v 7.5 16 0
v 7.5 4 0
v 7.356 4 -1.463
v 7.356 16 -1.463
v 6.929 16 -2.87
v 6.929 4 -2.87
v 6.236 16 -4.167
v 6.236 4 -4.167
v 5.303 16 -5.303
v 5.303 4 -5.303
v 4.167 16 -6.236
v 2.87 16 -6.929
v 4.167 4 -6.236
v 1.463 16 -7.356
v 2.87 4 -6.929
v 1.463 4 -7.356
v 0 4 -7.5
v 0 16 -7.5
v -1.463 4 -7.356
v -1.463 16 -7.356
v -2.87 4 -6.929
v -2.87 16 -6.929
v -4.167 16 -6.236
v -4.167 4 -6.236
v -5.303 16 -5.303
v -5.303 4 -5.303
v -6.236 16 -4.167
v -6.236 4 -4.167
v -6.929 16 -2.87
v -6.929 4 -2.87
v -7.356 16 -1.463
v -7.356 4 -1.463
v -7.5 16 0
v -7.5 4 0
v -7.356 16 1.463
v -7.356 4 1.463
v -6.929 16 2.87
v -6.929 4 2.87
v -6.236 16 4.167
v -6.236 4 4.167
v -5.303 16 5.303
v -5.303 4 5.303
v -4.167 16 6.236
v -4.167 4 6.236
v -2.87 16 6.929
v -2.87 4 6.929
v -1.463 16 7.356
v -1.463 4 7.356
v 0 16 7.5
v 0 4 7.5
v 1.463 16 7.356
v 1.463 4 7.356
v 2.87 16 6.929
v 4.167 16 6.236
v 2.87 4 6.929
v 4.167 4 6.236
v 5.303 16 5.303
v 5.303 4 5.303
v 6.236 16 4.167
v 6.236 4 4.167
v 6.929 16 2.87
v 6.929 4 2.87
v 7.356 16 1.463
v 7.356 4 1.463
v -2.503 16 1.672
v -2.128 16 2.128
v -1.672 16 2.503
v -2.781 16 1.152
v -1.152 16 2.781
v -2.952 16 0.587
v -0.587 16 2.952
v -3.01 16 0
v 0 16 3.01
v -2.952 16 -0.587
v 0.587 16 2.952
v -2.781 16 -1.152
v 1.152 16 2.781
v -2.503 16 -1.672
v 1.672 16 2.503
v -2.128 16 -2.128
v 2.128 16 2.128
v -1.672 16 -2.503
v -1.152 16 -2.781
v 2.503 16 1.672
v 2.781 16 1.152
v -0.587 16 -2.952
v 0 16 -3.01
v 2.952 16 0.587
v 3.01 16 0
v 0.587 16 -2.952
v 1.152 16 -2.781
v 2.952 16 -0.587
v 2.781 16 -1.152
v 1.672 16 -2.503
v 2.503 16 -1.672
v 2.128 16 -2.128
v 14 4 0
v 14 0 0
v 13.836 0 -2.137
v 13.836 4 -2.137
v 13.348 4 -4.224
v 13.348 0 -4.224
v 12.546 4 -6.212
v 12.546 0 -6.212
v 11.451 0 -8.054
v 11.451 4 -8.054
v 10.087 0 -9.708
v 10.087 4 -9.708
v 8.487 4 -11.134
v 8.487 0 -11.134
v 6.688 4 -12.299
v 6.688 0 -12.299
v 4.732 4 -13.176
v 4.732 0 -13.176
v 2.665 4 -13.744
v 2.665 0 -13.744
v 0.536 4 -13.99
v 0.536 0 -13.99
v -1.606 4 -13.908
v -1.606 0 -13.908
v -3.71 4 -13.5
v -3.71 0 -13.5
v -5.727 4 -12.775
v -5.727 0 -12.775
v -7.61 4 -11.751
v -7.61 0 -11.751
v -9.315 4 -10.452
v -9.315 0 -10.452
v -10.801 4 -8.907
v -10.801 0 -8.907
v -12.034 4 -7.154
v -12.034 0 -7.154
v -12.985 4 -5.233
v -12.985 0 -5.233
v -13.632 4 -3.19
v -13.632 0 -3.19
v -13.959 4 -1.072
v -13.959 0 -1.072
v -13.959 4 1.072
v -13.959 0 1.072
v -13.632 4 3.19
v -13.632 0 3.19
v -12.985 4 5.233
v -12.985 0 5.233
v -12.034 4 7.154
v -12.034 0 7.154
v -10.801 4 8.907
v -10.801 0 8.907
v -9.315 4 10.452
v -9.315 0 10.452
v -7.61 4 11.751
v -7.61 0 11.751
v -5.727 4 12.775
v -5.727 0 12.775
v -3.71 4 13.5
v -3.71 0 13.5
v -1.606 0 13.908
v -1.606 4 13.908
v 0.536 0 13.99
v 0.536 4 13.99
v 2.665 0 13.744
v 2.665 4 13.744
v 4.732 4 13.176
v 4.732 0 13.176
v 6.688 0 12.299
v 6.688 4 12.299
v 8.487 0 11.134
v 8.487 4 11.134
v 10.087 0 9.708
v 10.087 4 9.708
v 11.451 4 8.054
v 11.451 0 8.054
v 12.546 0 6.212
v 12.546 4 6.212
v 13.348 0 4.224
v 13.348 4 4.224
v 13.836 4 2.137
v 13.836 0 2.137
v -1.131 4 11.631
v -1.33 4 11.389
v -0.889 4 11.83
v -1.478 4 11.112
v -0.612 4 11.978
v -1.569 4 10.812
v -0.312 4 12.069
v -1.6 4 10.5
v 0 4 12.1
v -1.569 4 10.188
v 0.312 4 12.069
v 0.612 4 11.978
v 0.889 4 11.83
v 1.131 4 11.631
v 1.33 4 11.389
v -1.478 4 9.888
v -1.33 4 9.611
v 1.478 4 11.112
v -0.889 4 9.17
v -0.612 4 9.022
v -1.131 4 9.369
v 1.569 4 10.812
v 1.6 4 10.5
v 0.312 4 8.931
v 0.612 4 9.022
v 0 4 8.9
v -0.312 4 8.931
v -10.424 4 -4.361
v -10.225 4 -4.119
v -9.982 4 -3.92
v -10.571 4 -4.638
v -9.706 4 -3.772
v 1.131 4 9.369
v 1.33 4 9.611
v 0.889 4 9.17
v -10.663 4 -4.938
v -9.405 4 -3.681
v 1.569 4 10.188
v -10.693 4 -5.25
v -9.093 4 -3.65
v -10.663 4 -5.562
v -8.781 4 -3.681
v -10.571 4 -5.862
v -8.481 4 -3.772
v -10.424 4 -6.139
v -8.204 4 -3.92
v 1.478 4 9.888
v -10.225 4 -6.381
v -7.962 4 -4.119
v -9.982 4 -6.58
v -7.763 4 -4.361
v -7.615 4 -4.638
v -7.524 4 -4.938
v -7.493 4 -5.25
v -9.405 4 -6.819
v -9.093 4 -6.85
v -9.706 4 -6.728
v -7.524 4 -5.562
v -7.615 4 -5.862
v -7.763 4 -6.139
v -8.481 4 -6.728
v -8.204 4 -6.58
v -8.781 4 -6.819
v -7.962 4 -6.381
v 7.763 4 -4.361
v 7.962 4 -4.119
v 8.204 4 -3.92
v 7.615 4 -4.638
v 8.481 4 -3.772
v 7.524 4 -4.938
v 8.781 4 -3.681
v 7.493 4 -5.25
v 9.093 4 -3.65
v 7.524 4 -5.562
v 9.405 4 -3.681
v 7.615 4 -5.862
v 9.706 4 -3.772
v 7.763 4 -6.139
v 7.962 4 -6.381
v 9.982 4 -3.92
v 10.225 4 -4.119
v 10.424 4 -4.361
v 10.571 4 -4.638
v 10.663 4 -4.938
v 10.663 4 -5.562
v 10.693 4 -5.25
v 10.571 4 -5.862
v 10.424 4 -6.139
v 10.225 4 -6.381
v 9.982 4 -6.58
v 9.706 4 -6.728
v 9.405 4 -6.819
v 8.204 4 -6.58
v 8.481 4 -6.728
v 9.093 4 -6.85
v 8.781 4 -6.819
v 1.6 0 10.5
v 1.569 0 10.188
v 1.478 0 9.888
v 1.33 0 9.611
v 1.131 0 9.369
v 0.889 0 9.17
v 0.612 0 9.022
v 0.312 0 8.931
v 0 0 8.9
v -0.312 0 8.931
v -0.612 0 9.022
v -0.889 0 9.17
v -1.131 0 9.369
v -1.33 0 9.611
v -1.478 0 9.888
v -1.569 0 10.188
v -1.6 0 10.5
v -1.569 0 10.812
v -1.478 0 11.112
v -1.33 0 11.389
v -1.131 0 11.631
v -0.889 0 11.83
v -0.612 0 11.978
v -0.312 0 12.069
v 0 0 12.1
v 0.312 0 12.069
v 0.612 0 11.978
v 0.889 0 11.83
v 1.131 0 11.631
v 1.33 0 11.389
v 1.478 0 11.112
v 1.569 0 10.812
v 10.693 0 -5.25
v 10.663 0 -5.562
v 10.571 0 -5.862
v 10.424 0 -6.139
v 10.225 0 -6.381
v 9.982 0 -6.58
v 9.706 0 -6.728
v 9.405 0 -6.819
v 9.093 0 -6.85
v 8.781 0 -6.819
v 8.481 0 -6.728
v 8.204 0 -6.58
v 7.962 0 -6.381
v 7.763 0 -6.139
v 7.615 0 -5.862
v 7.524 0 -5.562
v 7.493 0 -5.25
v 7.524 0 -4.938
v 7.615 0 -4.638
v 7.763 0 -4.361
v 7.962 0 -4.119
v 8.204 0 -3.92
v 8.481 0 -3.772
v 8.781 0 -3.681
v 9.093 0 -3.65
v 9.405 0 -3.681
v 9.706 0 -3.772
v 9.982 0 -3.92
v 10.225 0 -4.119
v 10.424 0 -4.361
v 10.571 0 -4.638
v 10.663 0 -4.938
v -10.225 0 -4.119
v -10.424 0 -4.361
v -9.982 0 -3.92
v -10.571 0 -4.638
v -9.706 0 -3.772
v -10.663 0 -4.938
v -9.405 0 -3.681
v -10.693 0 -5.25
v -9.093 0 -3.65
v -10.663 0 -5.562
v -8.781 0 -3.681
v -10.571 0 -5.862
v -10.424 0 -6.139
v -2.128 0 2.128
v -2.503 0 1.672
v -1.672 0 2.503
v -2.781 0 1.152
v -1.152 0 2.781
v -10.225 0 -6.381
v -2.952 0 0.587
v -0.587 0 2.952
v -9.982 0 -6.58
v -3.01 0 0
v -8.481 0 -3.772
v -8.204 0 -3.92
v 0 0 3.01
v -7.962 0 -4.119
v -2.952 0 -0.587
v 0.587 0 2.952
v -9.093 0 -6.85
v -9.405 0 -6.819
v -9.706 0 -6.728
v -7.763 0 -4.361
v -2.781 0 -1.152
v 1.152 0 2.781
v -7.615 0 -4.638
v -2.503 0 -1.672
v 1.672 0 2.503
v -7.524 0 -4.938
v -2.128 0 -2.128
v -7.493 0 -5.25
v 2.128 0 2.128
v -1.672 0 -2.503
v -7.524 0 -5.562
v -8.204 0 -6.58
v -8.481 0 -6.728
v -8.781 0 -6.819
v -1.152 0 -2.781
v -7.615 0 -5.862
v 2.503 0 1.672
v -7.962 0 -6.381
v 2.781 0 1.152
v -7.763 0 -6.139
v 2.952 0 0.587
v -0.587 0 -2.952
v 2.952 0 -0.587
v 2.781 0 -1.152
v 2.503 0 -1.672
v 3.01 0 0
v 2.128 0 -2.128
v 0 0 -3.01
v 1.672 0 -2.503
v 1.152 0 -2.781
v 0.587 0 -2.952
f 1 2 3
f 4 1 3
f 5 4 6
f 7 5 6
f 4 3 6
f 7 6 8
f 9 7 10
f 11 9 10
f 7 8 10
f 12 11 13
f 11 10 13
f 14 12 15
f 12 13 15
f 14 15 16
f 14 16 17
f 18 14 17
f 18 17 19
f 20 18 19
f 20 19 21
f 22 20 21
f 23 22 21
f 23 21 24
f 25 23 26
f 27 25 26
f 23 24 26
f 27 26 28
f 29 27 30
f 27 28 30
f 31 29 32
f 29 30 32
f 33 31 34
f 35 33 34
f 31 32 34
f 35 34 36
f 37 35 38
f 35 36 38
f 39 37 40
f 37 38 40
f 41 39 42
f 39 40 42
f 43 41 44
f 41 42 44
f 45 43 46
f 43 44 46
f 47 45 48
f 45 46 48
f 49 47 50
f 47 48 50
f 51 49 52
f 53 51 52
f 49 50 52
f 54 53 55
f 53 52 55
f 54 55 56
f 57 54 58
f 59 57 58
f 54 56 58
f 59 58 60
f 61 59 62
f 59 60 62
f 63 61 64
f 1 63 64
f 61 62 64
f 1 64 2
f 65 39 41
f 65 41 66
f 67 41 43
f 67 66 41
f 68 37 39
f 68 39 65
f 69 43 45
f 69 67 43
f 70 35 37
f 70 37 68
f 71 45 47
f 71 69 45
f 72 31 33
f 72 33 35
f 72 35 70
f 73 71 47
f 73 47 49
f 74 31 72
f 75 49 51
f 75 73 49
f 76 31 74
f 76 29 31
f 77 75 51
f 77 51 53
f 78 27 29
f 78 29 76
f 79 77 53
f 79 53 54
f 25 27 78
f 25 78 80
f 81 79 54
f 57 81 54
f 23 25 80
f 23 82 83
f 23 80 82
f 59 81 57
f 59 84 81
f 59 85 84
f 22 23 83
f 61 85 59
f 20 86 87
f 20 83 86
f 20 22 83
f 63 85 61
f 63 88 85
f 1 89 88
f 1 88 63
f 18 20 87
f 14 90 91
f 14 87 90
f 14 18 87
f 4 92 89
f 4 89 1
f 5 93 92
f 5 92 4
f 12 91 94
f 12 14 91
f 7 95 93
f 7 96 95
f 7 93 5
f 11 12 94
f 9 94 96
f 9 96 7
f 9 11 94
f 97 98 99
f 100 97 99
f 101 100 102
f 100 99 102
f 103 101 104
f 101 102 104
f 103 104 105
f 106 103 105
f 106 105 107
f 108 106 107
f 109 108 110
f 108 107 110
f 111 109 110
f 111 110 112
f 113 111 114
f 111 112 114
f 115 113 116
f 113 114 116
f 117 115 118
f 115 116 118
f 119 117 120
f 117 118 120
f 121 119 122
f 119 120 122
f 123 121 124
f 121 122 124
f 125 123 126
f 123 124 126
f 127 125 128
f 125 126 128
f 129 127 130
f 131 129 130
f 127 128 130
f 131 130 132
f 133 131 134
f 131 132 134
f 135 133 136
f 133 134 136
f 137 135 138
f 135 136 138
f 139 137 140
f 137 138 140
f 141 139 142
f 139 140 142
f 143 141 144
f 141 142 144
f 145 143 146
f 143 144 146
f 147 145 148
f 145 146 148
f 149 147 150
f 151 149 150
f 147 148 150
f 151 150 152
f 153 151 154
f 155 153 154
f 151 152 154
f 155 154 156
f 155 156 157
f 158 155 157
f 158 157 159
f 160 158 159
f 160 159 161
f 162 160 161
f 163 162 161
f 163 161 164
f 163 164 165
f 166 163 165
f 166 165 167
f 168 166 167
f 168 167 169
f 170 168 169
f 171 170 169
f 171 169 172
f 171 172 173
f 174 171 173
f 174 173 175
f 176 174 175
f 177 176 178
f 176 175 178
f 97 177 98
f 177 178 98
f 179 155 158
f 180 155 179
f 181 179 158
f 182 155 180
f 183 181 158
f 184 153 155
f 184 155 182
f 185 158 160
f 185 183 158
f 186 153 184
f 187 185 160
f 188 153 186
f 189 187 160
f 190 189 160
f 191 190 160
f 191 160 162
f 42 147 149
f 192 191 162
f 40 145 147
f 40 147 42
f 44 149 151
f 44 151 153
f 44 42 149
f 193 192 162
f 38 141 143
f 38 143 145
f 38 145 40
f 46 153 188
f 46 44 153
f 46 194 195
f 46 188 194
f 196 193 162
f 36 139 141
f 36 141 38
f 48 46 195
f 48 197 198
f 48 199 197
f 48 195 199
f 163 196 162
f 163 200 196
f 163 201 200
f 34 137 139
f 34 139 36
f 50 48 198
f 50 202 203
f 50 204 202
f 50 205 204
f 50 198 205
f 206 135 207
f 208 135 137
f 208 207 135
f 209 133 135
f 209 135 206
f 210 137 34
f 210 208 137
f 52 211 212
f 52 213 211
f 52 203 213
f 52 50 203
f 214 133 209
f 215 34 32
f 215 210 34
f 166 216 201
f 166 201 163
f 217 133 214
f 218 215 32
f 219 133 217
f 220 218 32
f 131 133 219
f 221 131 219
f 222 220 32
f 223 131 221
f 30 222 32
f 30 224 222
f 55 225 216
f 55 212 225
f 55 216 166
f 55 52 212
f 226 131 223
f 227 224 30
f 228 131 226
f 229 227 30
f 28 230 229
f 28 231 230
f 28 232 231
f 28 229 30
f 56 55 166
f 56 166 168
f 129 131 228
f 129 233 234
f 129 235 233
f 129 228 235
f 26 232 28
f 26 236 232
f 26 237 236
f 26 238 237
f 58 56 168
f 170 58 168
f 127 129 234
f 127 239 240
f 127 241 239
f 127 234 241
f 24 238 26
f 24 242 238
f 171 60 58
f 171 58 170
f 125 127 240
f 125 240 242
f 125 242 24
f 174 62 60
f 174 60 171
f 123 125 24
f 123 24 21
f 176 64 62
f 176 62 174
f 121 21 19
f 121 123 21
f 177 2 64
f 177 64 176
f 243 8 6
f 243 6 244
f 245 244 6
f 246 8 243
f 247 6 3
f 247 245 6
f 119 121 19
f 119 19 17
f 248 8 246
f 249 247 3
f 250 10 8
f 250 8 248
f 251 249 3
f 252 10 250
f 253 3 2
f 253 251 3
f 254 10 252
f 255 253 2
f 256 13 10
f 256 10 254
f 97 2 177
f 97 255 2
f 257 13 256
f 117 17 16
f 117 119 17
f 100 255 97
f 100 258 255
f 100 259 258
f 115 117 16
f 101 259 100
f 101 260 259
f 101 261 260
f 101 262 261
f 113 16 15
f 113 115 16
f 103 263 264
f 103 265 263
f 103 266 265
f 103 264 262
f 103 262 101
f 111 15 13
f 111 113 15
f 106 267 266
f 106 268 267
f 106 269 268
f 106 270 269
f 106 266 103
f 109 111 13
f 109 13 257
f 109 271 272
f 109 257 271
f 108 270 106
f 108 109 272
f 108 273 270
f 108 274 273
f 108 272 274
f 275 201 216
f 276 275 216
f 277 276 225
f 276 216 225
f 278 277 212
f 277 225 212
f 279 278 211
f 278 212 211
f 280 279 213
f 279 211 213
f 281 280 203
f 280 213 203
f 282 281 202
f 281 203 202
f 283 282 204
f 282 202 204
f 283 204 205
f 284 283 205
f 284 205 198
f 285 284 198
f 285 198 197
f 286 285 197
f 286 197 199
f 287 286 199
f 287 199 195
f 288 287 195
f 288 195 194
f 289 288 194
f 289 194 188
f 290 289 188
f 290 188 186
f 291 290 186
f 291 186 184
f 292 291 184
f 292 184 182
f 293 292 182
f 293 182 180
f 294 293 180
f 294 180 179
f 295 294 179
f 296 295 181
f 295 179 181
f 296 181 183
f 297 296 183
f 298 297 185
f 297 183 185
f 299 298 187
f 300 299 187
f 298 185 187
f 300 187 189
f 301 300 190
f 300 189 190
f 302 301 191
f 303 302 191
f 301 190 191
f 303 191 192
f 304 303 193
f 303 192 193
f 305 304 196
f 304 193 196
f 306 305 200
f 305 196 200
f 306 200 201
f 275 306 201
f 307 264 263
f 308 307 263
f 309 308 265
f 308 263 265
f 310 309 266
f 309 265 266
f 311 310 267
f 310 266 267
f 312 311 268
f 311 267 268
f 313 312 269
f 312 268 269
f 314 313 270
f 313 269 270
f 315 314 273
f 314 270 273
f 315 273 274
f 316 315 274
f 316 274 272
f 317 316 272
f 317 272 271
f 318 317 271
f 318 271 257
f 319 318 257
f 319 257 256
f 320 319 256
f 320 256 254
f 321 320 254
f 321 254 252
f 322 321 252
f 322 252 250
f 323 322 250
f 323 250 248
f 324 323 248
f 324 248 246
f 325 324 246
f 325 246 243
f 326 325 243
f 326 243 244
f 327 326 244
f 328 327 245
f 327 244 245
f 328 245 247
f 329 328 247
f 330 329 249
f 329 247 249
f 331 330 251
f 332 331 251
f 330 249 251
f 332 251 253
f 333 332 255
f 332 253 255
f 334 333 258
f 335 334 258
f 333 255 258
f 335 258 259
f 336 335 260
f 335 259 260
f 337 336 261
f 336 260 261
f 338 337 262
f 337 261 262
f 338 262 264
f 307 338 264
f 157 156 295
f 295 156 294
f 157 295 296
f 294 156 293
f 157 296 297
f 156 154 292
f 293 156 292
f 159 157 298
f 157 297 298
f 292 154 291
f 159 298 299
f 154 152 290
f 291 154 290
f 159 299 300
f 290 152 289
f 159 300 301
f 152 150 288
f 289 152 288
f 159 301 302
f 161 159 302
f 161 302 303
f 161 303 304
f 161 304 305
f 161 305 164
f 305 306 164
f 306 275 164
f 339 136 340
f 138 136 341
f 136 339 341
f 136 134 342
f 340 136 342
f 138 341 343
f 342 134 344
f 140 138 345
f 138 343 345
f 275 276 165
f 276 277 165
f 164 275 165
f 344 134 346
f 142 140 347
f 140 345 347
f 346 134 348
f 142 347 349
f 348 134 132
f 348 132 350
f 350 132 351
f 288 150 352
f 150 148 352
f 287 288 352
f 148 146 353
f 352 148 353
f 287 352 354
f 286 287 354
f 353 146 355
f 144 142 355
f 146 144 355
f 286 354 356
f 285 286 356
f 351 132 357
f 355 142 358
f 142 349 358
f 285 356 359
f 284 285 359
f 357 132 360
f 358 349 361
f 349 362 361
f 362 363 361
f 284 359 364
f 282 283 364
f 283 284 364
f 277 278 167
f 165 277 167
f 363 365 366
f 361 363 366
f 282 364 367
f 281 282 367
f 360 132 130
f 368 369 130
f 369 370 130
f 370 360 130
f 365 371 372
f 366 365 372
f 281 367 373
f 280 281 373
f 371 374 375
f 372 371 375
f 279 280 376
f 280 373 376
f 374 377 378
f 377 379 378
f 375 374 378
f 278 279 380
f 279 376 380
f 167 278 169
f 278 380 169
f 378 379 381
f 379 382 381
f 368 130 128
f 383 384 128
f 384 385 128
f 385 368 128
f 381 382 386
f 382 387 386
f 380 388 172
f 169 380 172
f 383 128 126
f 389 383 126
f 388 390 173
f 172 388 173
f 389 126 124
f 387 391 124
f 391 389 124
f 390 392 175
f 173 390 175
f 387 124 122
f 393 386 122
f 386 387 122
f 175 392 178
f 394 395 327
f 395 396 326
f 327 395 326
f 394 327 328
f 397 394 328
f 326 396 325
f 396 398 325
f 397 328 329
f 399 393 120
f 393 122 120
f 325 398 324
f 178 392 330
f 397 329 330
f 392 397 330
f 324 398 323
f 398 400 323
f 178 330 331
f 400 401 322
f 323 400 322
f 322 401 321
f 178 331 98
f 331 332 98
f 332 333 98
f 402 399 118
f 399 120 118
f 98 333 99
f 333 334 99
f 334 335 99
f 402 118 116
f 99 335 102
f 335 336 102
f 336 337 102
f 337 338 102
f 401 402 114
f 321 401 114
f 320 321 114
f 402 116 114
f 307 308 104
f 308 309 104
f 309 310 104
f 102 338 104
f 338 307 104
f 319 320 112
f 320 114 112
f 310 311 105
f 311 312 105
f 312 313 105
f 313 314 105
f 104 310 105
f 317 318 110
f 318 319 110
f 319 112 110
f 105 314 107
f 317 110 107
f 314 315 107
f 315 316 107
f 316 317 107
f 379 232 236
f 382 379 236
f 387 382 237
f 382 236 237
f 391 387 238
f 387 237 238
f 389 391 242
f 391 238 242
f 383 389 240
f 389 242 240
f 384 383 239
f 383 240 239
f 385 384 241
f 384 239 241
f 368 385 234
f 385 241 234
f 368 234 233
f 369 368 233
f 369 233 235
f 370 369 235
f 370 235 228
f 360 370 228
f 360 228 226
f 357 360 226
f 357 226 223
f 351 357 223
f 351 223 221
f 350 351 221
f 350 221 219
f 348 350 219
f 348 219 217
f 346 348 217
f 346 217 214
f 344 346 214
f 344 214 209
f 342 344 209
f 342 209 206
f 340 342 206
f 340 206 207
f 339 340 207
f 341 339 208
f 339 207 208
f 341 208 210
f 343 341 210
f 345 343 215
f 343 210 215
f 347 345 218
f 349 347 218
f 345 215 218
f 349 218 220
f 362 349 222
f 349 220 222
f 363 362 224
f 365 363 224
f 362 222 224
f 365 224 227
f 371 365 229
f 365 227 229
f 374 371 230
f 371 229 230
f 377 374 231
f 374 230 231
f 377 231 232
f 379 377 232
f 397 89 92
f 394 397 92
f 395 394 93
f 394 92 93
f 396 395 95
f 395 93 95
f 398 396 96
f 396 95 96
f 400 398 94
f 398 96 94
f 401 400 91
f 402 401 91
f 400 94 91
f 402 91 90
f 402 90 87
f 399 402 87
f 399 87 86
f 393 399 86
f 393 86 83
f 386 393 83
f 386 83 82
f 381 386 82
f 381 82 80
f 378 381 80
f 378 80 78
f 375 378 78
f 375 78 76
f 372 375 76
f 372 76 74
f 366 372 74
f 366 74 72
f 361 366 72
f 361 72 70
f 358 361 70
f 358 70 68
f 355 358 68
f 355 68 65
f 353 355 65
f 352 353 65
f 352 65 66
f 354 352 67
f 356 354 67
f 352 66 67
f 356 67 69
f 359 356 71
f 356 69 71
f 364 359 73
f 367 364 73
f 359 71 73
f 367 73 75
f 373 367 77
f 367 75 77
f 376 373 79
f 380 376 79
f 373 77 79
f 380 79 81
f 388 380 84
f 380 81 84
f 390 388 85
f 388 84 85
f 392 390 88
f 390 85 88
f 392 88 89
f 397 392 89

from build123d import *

# Parameters (mm, degrees)
SKETCH2_R           = 14
BOSS_EXTRUDE1_DEPTH = 4
SKETCH3_R           = 7.5
BOSS_EXTRUDE2_DEPTH = 12
SKETCH4_R           = 3.01
CUT_EXTRUDE1_DEPTH  = 17
SKETCH5_R           = 1.6
CUT_EXTRUDE2_DEPTH  = 12


with BuildPart() as part:
    # Sketch2 → Boss-Extrude1 (new body)
    with BuildSketch(Plane(origin=(0, 0, 0), x_dir=(1, 0, 0), z_dir=(0, 1, 0))):
        Circle(SKETCH2_R)
    extrude(amount=BOSS_EXTRUDE1_DEPTH)

    # Sketch3 → Boss-Extrude2 (add)
    with BuildSketch(Plane(origin=(0, 4, 0), x_dir=(1, 0, 0), z_dir=(0, 1, 0))):
        Circle(SKETCH3_R)
    extrude(amount=BOSS_EXTRUDE2_DEPTH)

    # Sketch4 → Cut-Extrude1 (cut, through all)
    with BuildSketch(Plane(origin=(0, 16, 0), x_dir=(1, 0, 0), z_dir=(0, 1, 0))):
        Circle(SKETCH4_R)
    extrude(amount=-CUT_EXTRUDE1_DEPTH, mode=Mode.SUBTRACT)

    # Sketch5 → Cut-Extrude2 (cut)
    with BuildSketch(Plane(origin=(0, 4, 0), x_dir=(1, 0, 0), z_dir=(0, 1, 0))):
        with Locations((0, -10.5)):
            Circle(SKETCH5_R)
        with Locations((9.09326674, 5.25)):
            Circle(SKETCH5_R)
        with Locations((-9.09326674, 5.25)):
            Circle(SKETCH5_R)
    extrude(amount=-CUT_EXTRUDE2_DEPTH, mode=Mode.SUBTRACT)


solid = part.part
